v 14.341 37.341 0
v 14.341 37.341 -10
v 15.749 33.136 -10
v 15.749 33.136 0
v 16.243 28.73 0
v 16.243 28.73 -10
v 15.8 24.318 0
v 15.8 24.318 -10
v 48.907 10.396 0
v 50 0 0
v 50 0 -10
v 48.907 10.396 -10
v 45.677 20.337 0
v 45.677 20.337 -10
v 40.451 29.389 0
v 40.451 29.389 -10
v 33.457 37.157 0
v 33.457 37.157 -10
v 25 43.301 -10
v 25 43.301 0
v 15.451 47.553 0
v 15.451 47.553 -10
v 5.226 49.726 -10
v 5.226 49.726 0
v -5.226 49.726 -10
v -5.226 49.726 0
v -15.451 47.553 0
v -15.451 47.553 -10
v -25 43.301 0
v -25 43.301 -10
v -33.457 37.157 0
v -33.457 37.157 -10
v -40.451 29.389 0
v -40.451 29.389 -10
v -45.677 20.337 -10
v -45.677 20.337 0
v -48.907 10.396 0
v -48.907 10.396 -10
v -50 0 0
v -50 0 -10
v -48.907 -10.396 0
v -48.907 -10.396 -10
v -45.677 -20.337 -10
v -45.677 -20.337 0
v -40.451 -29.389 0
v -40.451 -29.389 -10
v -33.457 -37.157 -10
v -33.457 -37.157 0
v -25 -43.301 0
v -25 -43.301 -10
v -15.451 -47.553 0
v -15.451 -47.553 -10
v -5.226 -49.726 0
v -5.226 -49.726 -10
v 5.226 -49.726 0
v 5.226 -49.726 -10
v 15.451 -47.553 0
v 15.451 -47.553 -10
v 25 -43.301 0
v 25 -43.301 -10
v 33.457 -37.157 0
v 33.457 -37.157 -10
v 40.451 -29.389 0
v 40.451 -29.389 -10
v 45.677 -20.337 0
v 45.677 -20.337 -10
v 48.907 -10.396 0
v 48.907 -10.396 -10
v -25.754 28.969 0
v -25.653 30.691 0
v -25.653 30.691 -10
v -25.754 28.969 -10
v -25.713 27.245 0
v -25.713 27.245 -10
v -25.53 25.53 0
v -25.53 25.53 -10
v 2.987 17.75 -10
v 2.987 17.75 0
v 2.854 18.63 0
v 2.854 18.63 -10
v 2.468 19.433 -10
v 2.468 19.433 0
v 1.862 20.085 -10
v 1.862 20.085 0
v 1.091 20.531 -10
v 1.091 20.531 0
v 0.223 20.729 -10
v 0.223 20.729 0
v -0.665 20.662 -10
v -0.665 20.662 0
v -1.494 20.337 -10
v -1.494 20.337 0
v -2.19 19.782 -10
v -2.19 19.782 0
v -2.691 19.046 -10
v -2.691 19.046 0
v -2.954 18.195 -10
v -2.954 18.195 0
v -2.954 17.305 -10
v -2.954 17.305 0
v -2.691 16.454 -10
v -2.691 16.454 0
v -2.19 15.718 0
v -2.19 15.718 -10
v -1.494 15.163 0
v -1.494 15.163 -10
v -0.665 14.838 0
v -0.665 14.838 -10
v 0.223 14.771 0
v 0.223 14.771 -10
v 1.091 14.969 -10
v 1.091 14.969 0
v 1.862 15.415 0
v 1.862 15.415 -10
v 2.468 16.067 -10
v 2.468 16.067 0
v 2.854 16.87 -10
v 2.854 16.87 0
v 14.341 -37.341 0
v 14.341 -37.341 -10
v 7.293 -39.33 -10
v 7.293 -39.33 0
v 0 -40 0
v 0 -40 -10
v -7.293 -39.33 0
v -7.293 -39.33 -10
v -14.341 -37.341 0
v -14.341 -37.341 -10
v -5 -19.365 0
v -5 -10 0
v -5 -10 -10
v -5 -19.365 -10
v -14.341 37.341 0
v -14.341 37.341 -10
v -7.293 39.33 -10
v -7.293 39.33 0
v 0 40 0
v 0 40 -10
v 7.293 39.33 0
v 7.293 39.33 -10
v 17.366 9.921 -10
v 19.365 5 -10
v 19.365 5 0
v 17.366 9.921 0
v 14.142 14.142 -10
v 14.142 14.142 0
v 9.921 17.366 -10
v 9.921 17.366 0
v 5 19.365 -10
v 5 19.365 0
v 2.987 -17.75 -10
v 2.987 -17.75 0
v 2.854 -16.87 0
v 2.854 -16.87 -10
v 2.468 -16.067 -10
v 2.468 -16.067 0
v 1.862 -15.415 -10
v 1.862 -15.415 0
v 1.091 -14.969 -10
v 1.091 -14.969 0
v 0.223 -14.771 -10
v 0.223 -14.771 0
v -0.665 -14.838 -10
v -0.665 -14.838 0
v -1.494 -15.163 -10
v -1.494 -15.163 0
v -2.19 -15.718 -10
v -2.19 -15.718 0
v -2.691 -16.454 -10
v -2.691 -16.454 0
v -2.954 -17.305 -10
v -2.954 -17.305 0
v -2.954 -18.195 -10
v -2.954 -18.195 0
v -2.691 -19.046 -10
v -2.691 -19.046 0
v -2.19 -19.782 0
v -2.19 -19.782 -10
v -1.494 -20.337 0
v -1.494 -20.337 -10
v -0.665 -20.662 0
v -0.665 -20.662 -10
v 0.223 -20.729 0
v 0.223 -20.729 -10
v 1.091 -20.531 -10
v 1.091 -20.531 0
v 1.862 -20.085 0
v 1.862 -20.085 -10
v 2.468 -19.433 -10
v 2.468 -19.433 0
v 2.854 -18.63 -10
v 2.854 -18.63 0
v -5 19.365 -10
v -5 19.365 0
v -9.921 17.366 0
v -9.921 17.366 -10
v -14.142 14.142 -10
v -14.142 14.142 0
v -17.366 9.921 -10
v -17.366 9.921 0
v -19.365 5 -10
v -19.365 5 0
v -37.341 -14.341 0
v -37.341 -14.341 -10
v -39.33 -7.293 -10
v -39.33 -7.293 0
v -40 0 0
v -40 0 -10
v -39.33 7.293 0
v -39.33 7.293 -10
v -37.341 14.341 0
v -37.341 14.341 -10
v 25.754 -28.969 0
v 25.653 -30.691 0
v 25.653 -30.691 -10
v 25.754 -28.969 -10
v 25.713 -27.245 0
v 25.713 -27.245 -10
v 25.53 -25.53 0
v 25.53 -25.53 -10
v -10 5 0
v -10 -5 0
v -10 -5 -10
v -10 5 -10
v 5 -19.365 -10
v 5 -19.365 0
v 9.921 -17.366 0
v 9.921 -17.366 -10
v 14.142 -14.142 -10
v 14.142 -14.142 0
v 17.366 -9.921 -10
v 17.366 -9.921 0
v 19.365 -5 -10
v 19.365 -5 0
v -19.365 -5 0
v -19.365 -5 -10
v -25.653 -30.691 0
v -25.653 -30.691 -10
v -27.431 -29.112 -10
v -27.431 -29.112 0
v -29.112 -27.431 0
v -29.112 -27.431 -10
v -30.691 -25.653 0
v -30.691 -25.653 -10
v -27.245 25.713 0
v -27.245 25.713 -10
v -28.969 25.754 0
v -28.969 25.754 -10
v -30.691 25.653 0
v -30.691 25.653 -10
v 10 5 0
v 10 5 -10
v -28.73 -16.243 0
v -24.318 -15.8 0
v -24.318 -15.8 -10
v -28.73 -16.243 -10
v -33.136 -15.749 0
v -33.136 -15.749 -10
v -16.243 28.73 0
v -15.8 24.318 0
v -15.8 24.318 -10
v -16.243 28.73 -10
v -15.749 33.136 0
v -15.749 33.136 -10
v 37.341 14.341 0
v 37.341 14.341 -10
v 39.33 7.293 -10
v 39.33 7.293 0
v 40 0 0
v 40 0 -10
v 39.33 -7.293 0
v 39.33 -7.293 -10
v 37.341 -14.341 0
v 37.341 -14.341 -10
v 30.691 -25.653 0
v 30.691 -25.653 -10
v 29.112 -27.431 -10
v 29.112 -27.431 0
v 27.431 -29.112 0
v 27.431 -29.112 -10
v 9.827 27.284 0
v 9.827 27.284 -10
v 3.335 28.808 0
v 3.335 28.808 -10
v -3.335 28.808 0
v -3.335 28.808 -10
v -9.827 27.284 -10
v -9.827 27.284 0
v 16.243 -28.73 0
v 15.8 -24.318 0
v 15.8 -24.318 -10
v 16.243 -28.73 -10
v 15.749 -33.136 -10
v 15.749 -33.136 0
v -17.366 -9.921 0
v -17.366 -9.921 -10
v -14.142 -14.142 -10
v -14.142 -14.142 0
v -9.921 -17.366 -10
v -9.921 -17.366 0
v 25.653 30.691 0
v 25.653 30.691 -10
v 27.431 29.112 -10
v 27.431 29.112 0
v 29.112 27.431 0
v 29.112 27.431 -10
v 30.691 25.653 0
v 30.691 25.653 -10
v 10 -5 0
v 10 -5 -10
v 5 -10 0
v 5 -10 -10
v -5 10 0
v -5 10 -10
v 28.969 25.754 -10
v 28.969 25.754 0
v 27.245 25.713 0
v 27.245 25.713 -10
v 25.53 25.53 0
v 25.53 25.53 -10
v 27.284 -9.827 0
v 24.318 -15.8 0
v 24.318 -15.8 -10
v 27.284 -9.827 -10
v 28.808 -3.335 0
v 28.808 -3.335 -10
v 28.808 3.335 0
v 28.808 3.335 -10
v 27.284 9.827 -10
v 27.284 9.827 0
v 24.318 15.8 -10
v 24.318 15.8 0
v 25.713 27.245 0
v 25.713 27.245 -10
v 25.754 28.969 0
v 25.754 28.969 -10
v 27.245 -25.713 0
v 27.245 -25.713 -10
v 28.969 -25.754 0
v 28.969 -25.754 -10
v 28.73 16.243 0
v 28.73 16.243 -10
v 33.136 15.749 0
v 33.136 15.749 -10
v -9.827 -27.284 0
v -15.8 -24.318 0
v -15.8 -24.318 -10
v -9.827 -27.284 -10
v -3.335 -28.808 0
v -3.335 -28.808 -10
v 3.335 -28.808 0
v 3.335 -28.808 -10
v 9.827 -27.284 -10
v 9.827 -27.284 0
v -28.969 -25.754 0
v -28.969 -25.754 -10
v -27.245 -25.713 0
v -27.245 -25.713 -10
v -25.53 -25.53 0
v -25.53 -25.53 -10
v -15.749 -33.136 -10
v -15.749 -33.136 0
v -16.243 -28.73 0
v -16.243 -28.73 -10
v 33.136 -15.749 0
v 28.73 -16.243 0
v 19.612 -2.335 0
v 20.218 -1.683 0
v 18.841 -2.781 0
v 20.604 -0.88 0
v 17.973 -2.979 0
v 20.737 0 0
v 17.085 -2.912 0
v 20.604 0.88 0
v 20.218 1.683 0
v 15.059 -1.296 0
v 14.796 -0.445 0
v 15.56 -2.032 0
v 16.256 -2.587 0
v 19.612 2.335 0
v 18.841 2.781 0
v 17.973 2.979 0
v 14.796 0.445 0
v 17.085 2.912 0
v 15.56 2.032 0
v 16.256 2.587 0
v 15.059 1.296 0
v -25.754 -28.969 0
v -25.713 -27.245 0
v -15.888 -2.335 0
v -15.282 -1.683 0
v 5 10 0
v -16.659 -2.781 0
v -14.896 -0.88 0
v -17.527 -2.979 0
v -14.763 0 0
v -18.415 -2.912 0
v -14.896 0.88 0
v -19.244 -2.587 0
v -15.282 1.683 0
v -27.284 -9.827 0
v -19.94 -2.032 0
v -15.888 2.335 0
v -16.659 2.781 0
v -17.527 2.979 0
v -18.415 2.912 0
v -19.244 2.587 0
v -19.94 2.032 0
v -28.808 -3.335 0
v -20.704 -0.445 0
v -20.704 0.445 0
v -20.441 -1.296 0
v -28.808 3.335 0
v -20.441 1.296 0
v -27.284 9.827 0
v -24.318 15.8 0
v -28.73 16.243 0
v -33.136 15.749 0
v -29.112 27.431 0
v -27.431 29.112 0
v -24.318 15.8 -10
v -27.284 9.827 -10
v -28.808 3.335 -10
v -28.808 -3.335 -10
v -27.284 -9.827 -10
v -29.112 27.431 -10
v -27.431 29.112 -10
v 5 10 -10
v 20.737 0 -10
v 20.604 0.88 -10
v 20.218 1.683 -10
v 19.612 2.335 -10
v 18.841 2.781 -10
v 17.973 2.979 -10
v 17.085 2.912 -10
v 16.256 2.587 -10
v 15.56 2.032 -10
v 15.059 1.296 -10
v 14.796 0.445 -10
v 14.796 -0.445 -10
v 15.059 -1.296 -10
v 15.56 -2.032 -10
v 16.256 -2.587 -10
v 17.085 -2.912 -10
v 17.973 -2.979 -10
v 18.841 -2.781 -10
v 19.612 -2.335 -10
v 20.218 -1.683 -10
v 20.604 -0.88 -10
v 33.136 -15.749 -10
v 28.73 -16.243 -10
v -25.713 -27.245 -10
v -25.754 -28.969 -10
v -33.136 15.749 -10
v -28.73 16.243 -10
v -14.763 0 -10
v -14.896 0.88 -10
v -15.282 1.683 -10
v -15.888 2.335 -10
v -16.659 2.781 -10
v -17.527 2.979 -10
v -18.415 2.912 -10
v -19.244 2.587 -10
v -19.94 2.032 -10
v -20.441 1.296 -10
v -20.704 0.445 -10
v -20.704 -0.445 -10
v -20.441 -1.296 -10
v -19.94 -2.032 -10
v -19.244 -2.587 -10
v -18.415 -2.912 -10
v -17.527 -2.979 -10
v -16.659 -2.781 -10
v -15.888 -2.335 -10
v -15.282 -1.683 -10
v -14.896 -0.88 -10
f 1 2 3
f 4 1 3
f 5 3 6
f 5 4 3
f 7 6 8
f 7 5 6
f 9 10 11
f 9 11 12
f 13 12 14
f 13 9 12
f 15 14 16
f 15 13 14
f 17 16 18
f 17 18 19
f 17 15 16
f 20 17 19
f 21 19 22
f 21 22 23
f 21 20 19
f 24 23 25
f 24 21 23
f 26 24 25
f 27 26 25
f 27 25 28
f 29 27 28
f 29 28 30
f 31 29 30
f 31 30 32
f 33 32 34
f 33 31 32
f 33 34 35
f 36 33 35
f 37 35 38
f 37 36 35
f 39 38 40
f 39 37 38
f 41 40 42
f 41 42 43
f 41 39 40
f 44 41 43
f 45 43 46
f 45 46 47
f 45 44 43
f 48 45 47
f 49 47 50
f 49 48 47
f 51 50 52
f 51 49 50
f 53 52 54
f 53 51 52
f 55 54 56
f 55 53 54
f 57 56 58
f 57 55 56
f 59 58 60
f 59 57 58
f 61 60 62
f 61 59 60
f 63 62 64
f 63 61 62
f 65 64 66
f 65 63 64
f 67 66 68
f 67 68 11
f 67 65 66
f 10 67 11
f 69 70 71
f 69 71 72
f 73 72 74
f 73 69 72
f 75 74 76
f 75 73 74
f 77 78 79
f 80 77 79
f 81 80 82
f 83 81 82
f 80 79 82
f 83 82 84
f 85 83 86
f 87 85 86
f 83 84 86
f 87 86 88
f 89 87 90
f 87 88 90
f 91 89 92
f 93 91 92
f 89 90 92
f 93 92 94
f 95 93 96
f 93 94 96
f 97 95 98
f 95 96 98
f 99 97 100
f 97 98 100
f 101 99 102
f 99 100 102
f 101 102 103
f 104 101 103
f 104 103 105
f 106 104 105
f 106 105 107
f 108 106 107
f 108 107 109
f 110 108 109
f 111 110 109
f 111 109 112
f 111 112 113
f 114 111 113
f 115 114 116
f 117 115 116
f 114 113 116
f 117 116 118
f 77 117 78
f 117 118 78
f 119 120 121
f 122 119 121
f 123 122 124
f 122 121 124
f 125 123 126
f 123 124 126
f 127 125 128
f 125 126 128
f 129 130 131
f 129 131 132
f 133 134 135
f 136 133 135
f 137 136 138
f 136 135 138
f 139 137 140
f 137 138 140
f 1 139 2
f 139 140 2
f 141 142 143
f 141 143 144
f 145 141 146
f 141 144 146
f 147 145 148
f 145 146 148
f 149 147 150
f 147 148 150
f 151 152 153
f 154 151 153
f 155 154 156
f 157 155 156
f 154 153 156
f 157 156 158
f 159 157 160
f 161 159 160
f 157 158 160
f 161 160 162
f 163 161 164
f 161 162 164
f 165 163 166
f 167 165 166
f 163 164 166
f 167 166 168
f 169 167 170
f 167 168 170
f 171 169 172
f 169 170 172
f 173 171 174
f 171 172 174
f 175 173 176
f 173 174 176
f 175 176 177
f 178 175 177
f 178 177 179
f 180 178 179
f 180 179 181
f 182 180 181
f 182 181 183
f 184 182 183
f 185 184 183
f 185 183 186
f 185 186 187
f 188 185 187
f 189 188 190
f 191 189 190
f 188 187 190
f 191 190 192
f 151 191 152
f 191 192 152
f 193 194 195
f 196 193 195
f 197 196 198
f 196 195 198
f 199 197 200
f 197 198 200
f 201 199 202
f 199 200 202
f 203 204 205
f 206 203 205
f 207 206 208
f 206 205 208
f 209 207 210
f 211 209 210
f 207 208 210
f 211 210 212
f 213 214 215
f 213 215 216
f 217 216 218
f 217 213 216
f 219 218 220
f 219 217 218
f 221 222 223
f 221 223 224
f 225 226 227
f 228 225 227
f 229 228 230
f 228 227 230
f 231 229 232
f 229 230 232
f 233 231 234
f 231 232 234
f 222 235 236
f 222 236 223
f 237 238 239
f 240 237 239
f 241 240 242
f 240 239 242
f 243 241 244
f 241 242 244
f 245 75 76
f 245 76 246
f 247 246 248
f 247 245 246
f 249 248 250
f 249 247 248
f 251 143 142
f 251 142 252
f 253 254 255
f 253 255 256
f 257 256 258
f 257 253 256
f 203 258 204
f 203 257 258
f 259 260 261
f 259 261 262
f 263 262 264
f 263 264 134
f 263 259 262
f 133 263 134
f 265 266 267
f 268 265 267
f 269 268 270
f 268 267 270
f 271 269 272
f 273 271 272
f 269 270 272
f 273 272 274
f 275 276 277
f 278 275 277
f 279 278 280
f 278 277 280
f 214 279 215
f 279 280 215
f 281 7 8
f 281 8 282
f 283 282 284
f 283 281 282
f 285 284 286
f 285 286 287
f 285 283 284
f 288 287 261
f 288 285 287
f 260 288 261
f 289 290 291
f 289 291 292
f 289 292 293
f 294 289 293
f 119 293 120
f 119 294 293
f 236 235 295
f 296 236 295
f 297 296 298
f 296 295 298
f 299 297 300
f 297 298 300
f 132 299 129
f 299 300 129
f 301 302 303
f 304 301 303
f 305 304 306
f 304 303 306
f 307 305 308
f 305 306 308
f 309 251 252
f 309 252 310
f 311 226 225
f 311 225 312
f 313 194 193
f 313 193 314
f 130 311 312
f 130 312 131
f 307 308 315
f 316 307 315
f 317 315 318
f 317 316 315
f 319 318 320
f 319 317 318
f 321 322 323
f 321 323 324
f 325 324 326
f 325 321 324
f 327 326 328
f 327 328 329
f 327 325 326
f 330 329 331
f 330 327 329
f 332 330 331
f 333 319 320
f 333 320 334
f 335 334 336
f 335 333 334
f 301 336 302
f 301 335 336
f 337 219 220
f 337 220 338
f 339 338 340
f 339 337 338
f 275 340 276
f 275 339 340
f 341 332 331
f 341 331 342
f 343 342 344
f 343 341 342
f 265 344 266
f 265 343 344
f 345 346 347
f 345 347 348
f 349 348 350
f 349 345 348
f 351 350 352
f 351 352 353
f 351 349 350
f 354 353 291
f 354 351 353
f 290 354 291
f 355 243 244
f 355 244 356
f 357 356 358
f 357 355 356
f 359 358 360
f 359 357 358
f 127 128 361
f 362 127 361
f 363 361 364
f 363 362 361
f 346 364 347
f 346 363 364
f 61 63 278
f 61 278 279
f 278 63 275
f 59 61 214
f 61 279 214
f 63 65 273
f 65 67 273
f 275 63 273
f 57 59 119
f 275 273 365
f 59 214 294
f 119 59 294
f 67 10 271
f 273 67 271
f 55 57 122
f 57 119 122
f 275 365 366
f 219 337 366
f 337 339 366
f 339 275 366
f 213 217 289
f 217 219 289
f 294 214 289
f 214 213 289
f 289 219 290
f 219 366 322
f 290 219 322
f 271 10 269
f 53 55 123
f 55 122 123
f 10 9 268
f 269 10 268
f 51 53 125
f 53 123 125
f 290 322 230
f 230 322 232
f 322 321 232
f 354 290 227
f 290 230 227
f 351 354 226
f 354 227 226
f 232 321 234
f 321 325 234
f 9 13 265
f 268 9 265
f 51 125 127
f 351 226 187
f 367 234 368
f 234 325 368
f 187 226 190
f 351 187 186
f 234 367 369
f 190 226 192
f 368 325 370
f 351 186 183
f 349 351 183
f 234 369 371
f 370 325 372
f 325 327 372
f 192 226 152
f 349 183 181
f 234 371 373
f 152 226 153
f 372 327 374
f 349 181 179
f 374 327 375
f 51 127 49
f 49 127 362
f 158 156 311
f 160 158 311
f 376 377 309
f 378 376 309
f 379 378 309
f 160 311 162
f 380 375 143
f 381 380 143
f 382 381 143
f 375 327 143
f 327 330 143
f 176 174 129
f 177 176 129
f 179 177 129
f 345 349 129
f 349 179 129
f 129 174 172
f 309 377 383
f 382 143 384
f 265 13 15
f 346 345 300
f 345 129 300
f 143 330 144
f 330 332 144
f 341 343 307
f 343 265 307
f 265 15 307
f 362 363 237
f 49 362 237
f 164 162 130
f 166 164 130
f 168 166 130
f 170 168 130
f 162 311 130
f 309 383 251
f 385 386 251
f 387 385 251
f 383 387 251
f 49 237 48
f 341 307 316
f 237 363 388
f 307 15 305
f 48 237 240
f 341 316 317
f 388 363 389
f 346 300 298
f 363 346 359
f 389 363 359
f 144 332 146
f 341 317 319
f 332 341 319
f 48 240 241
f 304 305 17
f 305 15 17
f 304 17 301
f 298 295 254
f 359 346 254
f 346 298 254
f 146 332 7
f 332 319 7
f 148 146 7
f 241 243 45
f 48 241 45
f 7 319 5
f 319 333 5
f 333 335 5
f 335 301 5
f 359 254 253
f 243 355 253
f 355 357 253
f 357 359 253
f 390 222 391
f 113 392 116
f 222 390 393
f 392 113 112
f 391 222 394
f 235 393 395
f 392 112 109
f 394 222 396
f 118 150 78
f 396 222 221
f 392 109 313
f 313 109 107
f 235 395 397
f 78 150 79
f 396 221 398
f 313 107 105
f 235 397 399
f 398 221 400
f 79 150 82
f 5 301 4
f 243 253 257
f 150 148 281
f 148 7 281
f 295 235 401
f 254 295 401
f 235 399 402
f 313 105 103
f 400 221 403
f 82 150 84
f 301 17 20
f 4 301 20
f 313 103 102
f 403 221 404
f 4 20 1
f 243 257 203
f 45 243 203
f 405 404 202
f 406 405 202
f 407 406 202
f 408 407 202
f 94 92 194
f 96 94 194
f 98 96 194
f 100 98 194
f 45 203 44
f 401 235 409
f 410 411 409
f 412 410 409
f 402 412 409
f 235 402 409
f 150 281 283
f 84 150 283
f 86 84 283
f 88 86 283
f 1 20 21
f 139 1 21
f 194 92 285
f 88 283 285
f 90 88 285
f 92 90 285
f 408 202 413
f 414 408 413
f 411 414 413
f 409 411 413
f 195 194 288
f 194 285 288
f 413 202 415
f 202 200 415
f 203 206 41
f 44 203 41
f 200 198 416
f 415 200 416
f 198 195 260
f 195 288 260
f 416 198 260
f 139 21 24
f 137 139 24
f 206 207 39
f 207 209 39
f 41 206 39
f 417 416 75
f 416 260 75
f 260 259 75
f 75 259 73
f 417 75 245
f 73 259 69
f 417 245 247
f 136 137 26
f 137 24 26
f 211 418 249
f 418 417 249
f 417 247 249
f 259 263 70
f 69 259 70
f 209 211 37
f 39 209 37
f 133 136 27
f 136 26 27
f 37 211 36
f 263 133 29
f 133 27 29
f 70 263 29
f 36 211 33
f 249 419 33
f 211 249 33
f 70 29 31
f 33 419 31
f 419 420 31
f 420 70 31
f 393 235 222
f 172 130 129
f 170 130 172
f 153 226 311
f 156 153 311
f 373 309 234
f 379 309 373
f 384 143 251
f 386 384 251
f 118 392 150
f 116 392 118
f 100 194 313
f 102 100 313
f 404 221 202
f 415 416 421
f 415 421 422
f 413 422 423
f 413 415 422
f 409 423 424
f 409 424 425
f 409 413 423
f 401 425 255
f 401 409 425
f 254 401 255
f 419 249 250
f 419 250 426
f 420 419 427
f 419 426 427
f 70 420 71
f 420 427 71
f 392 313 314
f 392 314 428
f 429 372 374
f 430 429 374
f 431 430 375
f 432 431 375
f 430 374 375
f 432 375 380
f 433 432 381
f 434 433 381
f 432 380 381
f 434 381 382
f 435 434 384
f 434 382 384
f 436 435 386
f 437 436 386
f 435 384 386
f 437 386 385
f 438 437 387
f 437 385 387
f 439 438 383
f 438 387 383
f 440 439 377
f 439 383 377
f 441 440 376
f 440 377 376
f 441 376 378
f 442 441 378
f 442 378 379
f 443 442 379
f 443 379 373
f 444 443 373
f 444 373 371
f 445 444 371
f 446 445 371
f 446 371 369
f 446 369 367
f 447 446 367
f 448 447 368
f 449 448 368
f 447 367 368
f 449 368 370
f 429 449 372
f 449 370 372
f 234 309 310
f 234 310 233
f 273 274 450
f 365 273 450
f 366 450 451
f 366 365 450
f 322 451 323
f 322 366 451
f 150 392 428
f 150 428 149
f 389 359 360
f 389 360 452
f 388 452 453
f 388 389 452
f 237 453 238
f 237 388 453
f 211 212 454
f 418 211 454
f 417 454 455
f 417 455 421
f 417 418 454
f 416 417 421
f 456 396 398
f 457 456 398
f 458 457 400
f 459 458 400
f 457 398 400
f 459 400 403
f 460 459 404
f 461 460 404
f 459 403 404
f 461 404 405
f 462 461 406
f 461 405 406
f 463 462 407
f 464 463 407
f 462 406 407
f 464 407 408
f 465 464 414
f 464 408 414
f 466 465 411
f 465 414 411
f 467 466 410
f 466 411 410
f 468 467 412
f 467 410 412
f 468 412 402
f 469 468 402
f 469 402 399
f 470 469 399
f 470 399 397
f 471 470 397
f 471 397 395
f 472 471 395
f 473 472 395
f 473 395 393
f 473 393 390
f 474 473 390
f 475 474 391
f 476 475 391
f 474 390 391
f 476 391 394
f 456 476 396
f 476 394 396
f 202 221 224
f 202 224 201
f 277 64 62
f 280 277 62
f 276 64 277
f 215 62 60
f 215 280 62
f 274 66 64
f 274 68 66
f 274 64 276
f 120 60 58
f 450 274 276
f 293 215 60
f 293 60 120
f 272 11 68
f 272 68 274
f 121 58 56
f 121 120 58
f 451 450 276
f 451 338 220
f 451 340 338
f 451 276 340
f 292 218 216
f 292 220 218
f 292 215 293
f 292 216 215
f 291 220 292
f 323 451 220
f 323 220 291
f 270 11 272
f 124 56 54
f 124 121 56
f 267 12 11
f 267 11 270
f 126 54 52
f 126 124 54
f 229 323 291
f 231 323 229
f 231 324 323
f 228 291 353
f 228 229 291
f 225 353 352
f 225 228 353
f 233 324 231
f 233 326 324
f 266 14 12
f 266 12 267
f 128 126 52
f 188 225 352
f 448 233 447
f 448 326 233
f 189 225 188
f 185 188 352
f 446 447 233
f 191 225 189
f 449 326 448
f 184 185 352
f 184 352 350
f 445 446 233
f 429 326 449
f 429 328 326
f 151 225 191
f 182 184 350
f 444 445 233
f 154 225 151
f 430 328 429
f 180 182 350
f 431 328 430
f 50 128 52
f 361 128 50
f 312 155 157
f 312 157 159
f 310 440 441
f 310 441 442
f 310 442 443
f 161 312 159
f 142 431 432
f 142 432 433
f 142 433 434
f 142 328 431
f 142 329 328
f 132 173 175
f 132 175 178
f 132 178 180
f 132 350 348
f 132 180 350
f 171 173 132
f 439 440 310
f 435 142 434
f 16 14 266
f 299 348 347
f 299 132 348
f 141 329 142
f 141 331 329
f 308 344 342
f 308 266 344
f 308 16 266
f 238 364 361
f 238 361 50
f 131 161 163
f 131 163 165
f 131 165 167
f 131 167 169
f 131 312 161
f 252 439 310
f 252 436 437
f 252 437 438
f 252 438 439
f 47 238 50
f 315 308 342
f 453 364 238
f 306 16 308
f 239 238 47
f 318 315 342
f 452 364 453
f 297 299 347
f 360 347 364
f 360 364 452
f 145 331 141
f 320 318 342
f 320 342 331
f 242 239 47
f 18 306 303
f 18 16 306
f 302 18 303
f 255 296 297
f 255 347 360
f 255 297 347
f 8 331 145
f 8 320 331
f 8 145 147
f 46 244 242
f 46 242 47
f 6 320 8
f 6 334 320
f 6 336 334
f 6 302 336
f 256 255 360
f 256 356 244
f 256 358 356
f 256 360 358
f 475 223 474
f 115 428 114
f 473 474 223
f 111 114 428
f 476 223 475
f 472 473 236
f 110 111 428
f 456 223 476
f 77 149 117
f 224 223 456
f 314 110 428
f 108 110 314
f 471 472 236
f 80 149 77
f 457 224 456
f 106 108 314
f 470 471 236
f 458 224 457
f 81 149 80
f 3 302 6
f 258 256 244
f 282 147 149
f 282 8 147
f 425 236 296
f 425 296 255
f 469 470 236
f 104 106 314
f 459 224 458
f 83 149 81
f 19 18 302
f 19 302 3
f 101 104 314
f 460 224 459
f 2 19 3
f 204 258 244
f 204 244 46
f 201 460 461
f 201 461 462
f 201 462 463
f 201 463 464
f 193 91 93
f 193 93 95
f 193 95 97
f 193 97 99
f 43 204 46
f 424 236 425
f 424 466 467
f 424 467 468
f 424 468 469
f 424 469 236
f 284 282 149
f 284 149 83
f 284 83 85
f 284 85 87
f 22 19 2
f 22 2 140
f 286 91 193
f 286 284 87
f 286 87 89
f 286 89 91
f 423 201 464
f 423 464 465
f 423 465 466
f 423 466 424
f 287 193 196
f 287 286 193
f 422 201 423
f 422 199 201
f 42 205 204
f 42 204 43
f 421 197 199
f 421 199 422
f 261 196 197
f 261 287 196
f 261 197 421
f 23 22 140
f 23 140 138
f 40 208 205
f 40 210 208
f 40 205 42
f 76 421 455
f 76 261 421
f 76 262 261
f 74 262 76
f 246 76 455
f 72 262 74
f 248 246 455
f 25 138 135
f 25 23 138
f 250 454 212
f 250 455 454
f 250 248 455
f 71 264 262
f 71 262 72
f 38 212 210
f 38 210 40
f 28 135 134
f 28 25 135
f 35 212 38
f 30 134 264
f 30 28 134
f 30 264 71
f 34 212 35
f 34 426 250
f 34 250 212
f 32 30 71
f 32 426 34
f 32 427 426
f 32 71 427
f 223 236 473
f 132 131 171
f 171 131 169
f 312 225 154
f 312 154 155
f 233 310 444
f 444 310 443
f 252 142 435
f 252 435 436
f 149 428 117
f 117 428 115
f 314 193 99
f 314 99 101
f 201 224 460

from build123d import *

# Parameters (mm, degrees)
SKETCH6_R                    = 29
SKETCH6_R_2                  = 20
INNER_RING_DEPTH             = 10
MOTOR_CONNECTOR_CUT_DEPTH    = 10
SKETCH9_R                    = 50
SKETCH9_R_2                  = 29
OUTSIDE_RING_EXTRUSION_DEPTH = 10
SKETCH12_R                   = 45
SKETCH12_R_2                 = 27.5
CUT_EXTRUDE6_DEPTH           = 55
SKETCH8_R                    = 2.987
MOTOR_CONNECTOR_HOLES_DEPTH  = 10
SKETCH10_R                   = 27.404299948
PATTERN_DEPTH                = 10
SKETCH13_R                   = 45
SKETCH13_R_2                 = 40
BOSS_EXTRUDE1_DEPTH          = 10


with BuildPart() as part:
    # Sketch6 → Inner Ring (new body)
    with BuildSketch(Plane.XY):
        Circle(SKETCH6_R)
        Circle(SKETCH6_R_2, mode=Mode.SUBTRACT)
    extrude(amount=-INNER_RING_DEPTH)

    # Sketch7 → Motor Connector Cut (add)
    with BuildSketch(Plane.XY):
        with BuildLine():
            ThreePointArc((20, 0), (19.840593925, 2.52008585), (19.364916731, 5))
            Line((19.364916731, 5), (9.999996731, 5))
            Line((9.999996731, 5), (9.999996731, -5))
            Line((9.999996731, -5), (19.364916731, -5))
            ThreePointArc((19.364916731, -5), (19.840593925, -2.52008585), (20, 0))
        make_face()
        with BuildLine():
            ThreePointArc((5, 19.364916731), (0, 20), (-5, 19.364916731))
            Line((-5, 19.364916731), (-5, 9.999996731))
            Line((-5, 9.999996731), (5, 9.999996731))
            Line((5, 9.999996731), (5, 19.364916731))
        make_face()
        with BuildLine():
            Line((-9.999996731, -5), (-9.999996731, 5))
            Line((-9.999996731, 5), (-19.364916731, 5))
            ThreePointArc((-19.364916731, 5), (-20, 0), (-19.364916731, -5))
            Line((-19.364916731, -5), (-9.999996731, -5))
        make_face()
        with BuildLine():
            Line((-5, -9.999996731), (-5, -19.364916731))
            ThreePointArc((-5, -19.364916731), (0, -20), (5, -19.364916731))
            Line((5, -19.364916731), (5, -9.999996731))
            Line((5, -9.999996731), (-5, -9.999996731))
        make_face()
    extrude(amount=-MOTOR_CONNECTOR_CUT_DEPTH)

    # Sketch9 → Outside Ring Extrusion (add)
    with BuildSketch(Plane.XY):
        Circle(SKETCH9_R)
        Circle(SKETCH9_R_2, mode=Mode.SUBTRACT)
    extrude(amount=-OUTSIDE_RING_EXTRUSION_DEPTH)

    # Sketch12 → Cut-Extrude6 (cut)
    with BuildSketch(Plane.XY):
        Circle(SKETCH12_R)
        Circle(SKETCH12_R_2, mode=Mode.SUBTRACT)
    extrude(amount=-CUT_EXTRUDE6_DEPTH, mode=Mode.SUBTRACT)

    # Sketch8 → Motor Connector Holes (cut)
    with BuildSketch(Plane.XY):
        with Locations((0, 17.75)):
            Circle(SKETCH8_R)
        with Locations((17.75, 0)):
            Circle(SKETCH8_R)
        with Locations((0, -17.75)):
            Circle(SKETCH8_R)
        with Locations((-17.75, 0)):
            Circle(SKETCH8_R)
    extrude(amount=-MOTOR_CONNECTOR_HOLES_DEPTH, mode=Mode.SUBTRACT)

    # Sketch10 → Pattern (add)
    with BuildSketch(Plane.XY):
        with BuildLine():
            ThreePointArc((24.317625284, 15.800414568), (34.856582319, 15.291767932), (43.817916626, 9.721954269))
            ThreePointArc((43.817916626, 9.721954269), (41.607188912, 16.793289988), (38.263814419, 23.404867172))
            ThreePointArc((38.263814419, 23.404867172), (32.064348025, 25.470287935), (25.530148518, 25.530148518))
            ThreePointArc((25.530148518, 25.530148518), (25.475284033, 32.034279432), (23.432821057, 38.209639668))
            ThreePointArc((23.432821057, 38.209639668), (20.212556871, 40.002288656), (16.856128399, 41.524812789))
            ThreePointArc((16.856128399, 41.524812789), (13.384732217, 42.767397097), (9.823095744, 43.720997037))
            ThreePointArc((9.823095744, 43.720997037), (15.312499865, 34.789679765), (15.800414568, 24.317625284))
            ThreePointArc((15.800414568, 24.317625284), (0, 29), (-15.800414568, 24.317625284))
            ThreePointArc((-15.800414568, 24.317625284), (-15.312499865, 34.789679765), (-9.823095744, 43.720997037))
            ThreePointArc((-9.823095744, 43.720997037), (-16.854754984, 41.52536899), (-23.432821057, 38.209639668))
            ThreePointArc((-23.432821057, 38.209639668), (-25.475284033, 32.034279432), (-25.530148518, 25.530148518))
            ThreePointArc((-25.530148518, 25.530148518), (-32.064348025, 25.470287935), (-38.263814419, 23.404867172))
            ThreePointArc((-38.263814419, 23.404867172), (-41.607188912, 16.793289988), (-43.817916626, 9.721954269))
            ThreePointArc((-43.817916626, 9.721954269), (-34.856582319, 15.291767932), (-24.317625284, 15.800414568))
            ThreePointArc((-24.317625284, 15.800414568), (-29, 0), (-24.317625284, -15.800414568))
            ThreePointArc((-24.317625284, -15.800414568), (-34.894848495, -15.279799844), (-43.87309253, -9.663767027))
            ThreePointArc((-43.87309253, -9.663767027), (-41.716263612, -16.713446711), (-38.435015504, -23.315212041))
            ThreePointArc((-38.435015504, -23.315212041), (-32.159621016, -25.454161245), (-25.530148518, -25.530148518))
            ThreePointArc((-25.530148518, -25.530148518), (-25.448803812, -32.190695038), (-23.285614603, -38.490703716))
            ThreePointArc((-23.285614603, -38.490703716), (-16.649731385, -41.799208281), (-9.559859326, -43.970581744))
            ThreePointArc((-9.559859326, -43.970581744), (-15.258354287, -34.962784804), (-15.800414568, -24.317625284))
            ThreePointArc((-15.800414568, -24.317625284), (0, -29), (15.800414568, -24.317625284))
            ThreePointArc((15.800414568, -24.317625284), (15.258354287, -34.962784804), (9.559859326, -43.970581744))
            ThreePointArc((9.559859326, -43.970581744), (16.649731385, -41.799208281), (23.285614603, -38.490703716))
            ThreePointArc((23.285614603, -38.490703716), (25.448803812, -32.190695038), (25.530148518, -25.530148518))
            ThreePointArc((25.530148518, -25.530148518), (32.159621016, -25.454161245), (38.435015504, -23.315212041))
            ThreePointArc((38.435015504, -23.315212041), (41.716263612, -16.713446711), (43.87309253, -9.663767027))
            ThreePointArc((43.87309253, -9.663767027), (34.894848495, -15.279799844), (24.317625284, -15.800414568))
            ThreePointArc((24.317625284, -15.800414568), (29, 0), (24.317625284, 15.800414568))
        make_face()
        with Locations((-0.095700052, 0)):
            Circle(SKETCH10_R, mode=Mode.SUBTRACT)
    extrude(amount=-PATTERN_DEPTH)

    # Sketch13 → Boss-Extrude1 (add)
    with BuildSketch(Plane(origin=(0, 0, -10), x_dir=(-1, 0, 0), z_dir=(0, 0, -1))):
        Circle(SKETCH13_R)
        Circle(SKETCH13_R_2, mode=Mode.SUBTRACT)
    extrude(amount=-BOSS_EXTRUDE1_DEPTH)


solid = part.part
